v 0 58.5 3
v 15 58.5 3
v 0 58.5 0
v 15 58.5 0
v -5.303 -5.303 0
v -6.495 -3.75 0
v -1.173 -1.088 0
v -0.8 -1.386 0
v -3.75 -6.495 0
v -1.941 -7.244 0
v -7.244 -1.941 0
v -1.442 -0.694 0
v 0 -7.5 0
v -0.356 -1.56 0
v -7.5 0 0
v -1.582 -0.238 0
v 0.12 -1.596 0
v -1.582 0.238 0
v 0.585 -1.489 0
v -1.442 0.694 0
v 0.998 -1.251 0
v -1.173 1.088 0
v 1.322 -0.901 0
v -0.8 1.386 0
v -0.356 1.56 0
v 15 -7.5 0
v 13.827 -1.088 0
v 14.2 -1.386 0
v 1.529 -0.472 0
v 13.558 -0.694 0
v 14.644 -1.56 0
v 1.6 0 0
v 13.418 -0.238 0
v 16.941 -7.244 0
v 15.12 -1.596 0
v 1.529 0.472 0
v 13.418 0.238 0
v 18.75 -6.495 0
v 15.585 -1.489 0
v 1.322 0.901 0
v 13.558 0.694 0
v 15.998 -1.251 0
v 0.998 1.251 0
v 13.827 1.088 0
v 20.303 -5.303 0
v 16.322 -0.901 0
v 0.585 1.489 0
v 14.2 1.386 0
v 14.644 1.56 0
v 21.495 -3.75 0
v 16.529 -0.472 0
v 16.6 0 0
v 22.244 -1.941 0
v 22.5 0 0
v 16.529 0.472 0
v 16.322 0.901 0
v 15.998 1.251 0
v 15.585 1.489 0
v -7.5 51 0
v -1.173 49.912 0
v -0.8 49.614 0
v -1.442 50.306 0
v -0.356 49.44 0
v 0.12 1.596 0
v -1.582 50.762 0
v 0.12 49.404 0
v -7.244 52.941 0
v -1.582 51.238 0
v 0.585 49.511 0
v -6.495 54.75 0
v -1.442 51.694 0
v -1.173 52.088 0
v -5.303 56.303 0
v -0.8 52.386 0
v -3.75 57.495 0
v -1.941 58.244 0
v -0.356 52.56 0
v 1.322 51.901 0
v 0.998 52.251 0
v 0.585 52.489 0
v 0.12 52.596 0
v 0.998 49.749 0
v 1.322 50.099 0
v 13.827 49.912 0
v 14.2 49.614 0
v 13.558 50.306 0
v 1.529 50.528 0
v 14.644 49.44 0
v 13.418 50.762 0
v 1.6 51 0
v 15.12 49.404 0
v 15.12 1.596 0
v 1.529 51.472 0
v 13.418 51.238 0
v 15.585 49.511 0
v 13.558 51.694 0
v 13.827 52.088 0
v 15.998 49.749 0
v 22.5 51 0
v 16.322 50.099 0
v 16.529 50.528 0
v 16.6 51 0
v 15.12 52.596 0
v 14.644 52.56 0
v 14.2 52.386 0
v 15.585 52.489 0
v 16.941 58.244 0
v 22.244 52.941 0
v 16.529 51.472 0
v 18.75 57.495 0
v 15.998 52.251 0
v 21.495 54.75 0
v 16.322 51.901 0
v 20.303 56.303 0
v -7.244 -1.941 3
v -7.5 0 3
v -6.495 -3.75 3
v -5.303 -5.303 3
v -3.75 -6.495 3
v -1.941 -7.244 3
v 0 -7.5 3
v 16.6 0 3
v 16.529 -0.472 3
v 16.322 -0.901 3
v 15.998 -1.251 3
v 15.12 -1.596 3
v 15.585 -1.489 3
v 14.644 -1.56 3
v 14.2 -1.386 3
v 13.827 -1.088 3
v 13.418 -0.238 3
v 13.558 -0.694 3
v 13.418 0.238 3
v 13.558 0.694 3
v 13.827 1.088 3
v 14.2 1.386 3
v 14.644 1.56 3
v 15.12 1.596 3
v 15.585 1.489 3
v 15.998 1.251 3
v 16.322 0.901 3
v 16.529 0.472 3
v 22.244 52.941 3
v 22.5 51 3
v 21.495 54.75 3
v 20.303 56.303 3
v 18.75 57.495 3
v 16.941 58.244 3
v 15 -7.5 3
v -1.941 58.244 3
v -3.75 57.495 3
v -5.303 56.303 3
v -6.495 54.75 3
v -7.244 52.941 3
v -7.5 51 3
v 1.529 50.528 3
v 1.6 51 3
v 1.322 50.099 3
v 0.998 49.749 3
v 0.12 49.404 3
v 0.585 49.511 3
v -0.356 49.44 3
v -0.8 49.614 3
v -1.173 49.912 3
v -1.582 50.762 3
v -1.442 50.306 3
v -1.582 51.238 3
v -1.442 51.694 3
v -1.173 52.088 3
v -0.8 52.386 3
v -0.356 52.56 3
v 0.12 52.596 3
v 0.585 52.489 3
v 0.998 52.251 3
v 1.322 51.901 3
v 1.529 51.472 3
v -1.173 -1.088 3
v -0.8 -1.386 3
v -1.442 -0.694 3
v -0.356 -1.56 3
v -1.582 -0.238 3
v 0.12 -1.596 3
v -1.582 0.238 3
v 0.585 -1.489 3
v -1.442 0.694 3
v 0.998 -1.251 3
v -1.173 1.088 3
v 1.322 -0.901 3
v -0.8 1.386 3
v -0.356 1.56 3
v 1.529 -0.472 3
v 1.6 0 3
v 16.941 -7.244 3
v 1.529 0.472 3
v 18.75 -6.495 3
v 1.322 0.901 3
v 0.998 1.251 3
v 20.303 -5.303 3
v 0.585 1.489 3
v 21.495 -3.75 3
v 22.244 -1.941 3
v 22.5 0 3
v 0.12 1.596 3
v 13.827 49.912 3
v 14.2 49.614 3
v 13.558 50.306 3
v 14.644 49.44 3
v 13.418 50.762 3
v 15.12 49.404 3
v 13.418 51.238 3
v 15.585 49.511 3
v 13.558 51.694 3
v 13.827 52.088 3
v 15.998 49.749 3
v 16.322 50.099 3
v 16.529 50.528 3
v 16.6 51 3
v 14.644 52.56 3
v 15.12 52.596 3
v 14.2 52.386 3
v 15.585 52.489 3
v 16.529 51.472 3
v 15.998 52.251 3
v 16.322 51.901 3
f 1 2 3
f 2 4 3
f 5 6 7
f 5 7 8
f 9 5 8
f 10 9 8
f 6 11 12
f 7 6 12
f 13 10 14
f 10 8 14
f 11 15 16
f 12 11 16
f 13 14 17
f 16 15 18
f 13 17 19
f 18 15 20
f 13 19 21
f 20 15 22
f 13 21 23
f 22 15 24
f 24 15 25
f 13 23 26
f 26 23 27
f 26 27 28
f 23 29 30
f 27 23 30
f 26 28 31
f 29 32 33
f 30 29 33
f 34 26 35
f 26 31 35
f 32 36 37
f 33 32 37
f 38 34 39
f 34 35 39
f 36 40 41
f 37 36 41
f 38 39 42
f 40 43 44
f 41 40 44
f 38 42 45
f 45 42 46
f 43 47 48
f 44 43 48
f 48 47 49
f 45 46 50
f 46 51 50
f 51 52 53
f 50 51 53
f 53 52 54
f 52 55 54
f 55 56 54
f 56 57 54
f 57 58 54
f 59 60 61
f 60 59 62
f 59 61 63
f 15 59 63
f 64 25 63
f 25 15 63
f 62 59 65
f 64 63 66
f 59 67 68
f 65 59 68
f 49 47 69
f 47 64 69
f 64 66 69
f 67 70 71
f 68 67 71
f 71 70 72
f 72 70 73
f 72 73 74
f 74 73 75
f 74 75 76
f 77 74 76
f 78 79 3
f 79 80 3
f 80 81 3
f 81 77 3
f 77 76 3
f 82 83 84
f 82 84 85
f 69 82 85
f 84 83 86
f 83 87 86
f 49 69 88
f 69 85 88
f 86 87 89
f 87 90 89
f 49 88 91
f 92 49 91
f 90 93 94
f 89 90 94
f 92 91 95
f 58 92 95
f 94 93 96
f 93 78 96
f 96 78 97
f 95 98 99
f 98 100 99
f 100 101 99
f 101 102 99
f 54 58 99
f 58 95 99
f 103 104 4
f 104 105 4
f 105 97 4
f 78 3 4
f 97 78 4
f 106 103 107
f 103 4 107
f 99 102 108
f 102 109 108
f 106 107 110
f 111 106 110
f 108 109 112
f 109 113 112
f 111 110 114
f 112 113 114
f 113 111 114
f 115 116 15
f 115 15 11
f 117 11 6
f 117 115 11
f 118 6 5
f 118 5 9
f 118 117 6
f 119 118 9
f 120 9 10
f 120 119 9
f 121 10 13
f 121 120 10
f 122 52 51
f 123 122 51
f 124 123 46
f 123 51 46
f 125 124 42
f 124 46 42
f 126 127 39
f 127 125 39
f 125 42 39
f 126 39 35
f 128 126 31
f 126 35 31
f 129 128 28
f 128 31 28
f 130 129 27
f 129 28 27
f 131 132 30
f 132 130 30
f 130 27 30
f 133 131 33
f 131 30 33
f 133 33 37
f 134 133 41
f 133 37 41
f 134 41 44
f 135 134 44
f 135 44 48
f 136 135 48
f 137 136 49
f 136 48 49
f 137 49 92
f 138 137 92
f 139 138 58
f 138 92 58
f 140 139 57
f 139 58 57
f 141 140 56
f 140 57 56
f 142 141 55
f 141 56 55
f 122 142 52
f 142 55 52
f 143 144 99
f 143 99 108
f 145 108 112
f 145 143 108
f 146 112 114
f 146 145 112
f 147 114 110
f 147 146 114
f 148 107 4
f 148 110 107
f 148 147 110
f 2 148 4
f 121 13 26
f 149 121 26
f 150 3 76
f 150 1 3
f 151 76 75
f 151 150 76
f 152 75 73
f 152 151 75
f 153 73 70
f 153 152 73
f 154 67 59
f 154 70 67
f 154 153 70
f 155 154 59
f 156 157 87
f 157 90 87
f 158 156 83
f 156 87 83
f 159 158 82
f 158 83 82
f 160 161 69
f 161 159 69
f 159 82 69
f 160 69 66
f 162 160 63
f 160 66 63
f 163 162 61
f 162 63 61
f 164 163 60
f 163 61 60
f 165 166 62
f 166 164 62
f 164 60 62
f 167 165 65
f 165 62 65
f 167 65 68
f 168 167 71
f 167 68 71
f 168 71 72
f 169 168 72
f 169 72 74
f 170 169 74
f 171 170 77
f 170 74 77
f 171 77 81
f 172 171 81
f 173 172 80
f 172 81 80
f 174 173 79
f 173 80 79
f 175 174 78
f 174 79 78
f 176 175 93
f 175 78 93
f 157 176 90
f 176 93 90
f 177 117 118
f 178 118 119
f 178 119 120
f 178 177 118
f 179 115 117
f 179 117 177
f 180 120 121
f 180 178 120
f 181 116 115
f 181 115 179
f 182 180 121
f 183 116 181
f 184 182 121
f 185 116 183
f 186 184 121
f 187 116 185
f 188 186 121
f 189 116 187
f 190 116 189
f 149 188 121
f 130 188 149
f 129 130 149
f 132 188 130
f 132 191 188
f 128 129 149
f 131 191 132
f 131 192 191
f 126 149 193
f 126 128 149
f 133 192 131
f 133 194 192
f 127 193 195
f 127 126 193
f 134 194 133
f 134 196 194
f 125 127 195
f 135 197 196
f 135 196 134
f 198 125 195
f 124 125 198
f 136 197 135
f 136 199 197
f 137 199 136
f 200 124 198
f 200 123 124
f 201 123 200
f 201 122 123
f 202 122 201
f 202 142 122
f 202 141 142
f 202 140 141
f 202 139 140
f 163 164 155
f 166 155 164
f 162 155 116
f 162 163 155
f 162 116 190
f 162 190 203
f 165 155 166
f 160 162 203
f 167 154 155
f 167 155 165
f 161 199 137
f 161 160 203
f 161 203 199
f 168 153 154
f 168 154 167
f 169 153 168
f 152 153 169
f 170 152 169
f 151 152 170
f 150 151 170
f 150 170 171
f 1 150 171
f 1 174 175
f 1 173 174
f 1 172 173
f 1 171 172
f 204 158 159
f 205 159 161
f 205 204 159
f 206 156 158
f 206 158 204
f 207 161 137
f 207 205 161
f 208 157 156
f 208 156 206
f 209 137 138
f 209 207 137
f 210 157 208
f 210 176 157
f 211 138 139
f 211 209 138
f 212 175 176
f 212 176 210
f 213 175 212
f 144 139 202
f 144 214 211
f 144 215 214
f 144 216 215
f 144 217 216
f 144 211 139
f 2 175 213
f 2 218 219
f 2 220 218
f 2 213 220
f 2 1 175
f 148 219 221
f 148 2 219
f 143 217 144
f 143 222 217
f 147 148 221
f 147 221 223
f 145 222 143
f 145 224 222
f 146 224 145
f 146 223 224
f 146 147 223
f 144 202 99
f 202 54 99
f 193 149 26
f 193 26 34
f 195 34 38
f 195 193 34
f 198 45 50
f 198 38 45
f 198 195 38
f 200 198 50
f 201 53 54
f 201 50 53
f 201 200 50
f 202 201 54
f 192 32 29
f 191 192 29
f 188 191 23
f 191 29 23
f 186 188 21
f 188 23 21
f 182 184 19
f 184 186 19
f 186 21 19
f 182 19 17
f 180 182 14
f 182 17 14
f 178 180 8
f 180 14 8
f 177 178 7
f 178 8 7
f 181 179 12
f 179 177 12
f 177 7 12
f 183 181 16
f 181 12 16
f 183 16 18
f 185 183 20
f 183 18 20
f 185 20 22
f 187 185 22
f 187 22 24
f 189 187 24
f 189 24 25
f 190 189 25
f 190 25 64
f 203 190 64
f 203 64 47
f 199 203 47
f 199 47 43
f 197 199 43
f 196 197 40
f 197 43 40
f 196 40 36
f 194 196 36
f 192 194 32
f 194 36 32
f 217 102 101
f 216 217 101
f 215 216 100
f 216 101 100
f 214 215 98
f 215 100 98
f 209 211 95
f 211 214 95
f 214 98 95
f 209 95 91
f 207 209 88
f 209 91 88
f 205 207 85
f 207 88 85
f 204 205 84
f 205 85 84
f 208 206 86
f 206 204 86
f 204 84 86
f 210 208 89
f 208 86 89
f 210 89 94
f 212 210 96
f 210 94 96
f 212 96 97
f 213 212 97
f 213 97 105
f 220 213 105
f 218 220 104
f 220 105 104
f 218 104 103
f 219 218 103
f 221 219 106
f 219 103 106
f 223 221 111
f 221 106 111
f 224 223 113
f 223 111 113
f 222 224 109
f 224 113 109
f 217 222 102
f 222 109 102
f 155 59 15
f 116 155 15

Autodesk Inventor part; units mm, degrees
ref_plane "YZ Plane" through (0, 0, 0) normal (1, 0, 0) x (0, 1, 0)
ref_plane "XZ Plane" through (0, 0, 0) normal (0, 1, 0) x (-1, 0, 0)
ref_plane "XY Plane" through (0, 0, 0) normal (0, 0, 1) x (1, 0, 0)
sketch "スケッチ1" plane through (0, 0, 0) normal (0, 0, 1) x (1, 0, 0)
  circle A0 centre (0, 0) radius 1.6
  circle A1 centre (15, 0) radius 1.6
  circle A2 centre (0, 51) radius 1.6
  circle A3 centre (15, 51) radius 1.6
  line L0 (-7.5, -7.5) -> (22.5, -7.5)
  line L1 (22.5, -7.5) -> (22.5, 58.5)
  line L2 (22.5, 58.5) -> (-7.5, 58.5)
  line L3 (-7.5, 58.5) -> (-7.5, -7.5)
  dimension "d0" = 3.2
  dimension "d1" = 3.2
  dimension "d2" = 3.2
  dimension "d3" = 3.2
  dimension "d4" = 15
  dimension "d5" = 51
  dimension "d6" = 7.5
  dimension "d7" = 7.5
  dimension "d8" = 7.5
  dimension "d9" = 7.5
extrude "押し出し1" add sketch "スケッチ1" along normal blind 3
fillet "フィレット1" radius 7.5 4 edges at (-7.5, 58.5, 1.5) (22.5, 58.5, 1.5) (22.5, -7.5, 1.5) (-7.5, -7.5, 1.5)
sketch "スケッチ2" plane through (0, 0, 3) normal (0, 0, 1) x (1, 0, 0)
  point P0 (0, 0)
properties part number "オムニ_固定具4" material "アルミニウム 6061"
